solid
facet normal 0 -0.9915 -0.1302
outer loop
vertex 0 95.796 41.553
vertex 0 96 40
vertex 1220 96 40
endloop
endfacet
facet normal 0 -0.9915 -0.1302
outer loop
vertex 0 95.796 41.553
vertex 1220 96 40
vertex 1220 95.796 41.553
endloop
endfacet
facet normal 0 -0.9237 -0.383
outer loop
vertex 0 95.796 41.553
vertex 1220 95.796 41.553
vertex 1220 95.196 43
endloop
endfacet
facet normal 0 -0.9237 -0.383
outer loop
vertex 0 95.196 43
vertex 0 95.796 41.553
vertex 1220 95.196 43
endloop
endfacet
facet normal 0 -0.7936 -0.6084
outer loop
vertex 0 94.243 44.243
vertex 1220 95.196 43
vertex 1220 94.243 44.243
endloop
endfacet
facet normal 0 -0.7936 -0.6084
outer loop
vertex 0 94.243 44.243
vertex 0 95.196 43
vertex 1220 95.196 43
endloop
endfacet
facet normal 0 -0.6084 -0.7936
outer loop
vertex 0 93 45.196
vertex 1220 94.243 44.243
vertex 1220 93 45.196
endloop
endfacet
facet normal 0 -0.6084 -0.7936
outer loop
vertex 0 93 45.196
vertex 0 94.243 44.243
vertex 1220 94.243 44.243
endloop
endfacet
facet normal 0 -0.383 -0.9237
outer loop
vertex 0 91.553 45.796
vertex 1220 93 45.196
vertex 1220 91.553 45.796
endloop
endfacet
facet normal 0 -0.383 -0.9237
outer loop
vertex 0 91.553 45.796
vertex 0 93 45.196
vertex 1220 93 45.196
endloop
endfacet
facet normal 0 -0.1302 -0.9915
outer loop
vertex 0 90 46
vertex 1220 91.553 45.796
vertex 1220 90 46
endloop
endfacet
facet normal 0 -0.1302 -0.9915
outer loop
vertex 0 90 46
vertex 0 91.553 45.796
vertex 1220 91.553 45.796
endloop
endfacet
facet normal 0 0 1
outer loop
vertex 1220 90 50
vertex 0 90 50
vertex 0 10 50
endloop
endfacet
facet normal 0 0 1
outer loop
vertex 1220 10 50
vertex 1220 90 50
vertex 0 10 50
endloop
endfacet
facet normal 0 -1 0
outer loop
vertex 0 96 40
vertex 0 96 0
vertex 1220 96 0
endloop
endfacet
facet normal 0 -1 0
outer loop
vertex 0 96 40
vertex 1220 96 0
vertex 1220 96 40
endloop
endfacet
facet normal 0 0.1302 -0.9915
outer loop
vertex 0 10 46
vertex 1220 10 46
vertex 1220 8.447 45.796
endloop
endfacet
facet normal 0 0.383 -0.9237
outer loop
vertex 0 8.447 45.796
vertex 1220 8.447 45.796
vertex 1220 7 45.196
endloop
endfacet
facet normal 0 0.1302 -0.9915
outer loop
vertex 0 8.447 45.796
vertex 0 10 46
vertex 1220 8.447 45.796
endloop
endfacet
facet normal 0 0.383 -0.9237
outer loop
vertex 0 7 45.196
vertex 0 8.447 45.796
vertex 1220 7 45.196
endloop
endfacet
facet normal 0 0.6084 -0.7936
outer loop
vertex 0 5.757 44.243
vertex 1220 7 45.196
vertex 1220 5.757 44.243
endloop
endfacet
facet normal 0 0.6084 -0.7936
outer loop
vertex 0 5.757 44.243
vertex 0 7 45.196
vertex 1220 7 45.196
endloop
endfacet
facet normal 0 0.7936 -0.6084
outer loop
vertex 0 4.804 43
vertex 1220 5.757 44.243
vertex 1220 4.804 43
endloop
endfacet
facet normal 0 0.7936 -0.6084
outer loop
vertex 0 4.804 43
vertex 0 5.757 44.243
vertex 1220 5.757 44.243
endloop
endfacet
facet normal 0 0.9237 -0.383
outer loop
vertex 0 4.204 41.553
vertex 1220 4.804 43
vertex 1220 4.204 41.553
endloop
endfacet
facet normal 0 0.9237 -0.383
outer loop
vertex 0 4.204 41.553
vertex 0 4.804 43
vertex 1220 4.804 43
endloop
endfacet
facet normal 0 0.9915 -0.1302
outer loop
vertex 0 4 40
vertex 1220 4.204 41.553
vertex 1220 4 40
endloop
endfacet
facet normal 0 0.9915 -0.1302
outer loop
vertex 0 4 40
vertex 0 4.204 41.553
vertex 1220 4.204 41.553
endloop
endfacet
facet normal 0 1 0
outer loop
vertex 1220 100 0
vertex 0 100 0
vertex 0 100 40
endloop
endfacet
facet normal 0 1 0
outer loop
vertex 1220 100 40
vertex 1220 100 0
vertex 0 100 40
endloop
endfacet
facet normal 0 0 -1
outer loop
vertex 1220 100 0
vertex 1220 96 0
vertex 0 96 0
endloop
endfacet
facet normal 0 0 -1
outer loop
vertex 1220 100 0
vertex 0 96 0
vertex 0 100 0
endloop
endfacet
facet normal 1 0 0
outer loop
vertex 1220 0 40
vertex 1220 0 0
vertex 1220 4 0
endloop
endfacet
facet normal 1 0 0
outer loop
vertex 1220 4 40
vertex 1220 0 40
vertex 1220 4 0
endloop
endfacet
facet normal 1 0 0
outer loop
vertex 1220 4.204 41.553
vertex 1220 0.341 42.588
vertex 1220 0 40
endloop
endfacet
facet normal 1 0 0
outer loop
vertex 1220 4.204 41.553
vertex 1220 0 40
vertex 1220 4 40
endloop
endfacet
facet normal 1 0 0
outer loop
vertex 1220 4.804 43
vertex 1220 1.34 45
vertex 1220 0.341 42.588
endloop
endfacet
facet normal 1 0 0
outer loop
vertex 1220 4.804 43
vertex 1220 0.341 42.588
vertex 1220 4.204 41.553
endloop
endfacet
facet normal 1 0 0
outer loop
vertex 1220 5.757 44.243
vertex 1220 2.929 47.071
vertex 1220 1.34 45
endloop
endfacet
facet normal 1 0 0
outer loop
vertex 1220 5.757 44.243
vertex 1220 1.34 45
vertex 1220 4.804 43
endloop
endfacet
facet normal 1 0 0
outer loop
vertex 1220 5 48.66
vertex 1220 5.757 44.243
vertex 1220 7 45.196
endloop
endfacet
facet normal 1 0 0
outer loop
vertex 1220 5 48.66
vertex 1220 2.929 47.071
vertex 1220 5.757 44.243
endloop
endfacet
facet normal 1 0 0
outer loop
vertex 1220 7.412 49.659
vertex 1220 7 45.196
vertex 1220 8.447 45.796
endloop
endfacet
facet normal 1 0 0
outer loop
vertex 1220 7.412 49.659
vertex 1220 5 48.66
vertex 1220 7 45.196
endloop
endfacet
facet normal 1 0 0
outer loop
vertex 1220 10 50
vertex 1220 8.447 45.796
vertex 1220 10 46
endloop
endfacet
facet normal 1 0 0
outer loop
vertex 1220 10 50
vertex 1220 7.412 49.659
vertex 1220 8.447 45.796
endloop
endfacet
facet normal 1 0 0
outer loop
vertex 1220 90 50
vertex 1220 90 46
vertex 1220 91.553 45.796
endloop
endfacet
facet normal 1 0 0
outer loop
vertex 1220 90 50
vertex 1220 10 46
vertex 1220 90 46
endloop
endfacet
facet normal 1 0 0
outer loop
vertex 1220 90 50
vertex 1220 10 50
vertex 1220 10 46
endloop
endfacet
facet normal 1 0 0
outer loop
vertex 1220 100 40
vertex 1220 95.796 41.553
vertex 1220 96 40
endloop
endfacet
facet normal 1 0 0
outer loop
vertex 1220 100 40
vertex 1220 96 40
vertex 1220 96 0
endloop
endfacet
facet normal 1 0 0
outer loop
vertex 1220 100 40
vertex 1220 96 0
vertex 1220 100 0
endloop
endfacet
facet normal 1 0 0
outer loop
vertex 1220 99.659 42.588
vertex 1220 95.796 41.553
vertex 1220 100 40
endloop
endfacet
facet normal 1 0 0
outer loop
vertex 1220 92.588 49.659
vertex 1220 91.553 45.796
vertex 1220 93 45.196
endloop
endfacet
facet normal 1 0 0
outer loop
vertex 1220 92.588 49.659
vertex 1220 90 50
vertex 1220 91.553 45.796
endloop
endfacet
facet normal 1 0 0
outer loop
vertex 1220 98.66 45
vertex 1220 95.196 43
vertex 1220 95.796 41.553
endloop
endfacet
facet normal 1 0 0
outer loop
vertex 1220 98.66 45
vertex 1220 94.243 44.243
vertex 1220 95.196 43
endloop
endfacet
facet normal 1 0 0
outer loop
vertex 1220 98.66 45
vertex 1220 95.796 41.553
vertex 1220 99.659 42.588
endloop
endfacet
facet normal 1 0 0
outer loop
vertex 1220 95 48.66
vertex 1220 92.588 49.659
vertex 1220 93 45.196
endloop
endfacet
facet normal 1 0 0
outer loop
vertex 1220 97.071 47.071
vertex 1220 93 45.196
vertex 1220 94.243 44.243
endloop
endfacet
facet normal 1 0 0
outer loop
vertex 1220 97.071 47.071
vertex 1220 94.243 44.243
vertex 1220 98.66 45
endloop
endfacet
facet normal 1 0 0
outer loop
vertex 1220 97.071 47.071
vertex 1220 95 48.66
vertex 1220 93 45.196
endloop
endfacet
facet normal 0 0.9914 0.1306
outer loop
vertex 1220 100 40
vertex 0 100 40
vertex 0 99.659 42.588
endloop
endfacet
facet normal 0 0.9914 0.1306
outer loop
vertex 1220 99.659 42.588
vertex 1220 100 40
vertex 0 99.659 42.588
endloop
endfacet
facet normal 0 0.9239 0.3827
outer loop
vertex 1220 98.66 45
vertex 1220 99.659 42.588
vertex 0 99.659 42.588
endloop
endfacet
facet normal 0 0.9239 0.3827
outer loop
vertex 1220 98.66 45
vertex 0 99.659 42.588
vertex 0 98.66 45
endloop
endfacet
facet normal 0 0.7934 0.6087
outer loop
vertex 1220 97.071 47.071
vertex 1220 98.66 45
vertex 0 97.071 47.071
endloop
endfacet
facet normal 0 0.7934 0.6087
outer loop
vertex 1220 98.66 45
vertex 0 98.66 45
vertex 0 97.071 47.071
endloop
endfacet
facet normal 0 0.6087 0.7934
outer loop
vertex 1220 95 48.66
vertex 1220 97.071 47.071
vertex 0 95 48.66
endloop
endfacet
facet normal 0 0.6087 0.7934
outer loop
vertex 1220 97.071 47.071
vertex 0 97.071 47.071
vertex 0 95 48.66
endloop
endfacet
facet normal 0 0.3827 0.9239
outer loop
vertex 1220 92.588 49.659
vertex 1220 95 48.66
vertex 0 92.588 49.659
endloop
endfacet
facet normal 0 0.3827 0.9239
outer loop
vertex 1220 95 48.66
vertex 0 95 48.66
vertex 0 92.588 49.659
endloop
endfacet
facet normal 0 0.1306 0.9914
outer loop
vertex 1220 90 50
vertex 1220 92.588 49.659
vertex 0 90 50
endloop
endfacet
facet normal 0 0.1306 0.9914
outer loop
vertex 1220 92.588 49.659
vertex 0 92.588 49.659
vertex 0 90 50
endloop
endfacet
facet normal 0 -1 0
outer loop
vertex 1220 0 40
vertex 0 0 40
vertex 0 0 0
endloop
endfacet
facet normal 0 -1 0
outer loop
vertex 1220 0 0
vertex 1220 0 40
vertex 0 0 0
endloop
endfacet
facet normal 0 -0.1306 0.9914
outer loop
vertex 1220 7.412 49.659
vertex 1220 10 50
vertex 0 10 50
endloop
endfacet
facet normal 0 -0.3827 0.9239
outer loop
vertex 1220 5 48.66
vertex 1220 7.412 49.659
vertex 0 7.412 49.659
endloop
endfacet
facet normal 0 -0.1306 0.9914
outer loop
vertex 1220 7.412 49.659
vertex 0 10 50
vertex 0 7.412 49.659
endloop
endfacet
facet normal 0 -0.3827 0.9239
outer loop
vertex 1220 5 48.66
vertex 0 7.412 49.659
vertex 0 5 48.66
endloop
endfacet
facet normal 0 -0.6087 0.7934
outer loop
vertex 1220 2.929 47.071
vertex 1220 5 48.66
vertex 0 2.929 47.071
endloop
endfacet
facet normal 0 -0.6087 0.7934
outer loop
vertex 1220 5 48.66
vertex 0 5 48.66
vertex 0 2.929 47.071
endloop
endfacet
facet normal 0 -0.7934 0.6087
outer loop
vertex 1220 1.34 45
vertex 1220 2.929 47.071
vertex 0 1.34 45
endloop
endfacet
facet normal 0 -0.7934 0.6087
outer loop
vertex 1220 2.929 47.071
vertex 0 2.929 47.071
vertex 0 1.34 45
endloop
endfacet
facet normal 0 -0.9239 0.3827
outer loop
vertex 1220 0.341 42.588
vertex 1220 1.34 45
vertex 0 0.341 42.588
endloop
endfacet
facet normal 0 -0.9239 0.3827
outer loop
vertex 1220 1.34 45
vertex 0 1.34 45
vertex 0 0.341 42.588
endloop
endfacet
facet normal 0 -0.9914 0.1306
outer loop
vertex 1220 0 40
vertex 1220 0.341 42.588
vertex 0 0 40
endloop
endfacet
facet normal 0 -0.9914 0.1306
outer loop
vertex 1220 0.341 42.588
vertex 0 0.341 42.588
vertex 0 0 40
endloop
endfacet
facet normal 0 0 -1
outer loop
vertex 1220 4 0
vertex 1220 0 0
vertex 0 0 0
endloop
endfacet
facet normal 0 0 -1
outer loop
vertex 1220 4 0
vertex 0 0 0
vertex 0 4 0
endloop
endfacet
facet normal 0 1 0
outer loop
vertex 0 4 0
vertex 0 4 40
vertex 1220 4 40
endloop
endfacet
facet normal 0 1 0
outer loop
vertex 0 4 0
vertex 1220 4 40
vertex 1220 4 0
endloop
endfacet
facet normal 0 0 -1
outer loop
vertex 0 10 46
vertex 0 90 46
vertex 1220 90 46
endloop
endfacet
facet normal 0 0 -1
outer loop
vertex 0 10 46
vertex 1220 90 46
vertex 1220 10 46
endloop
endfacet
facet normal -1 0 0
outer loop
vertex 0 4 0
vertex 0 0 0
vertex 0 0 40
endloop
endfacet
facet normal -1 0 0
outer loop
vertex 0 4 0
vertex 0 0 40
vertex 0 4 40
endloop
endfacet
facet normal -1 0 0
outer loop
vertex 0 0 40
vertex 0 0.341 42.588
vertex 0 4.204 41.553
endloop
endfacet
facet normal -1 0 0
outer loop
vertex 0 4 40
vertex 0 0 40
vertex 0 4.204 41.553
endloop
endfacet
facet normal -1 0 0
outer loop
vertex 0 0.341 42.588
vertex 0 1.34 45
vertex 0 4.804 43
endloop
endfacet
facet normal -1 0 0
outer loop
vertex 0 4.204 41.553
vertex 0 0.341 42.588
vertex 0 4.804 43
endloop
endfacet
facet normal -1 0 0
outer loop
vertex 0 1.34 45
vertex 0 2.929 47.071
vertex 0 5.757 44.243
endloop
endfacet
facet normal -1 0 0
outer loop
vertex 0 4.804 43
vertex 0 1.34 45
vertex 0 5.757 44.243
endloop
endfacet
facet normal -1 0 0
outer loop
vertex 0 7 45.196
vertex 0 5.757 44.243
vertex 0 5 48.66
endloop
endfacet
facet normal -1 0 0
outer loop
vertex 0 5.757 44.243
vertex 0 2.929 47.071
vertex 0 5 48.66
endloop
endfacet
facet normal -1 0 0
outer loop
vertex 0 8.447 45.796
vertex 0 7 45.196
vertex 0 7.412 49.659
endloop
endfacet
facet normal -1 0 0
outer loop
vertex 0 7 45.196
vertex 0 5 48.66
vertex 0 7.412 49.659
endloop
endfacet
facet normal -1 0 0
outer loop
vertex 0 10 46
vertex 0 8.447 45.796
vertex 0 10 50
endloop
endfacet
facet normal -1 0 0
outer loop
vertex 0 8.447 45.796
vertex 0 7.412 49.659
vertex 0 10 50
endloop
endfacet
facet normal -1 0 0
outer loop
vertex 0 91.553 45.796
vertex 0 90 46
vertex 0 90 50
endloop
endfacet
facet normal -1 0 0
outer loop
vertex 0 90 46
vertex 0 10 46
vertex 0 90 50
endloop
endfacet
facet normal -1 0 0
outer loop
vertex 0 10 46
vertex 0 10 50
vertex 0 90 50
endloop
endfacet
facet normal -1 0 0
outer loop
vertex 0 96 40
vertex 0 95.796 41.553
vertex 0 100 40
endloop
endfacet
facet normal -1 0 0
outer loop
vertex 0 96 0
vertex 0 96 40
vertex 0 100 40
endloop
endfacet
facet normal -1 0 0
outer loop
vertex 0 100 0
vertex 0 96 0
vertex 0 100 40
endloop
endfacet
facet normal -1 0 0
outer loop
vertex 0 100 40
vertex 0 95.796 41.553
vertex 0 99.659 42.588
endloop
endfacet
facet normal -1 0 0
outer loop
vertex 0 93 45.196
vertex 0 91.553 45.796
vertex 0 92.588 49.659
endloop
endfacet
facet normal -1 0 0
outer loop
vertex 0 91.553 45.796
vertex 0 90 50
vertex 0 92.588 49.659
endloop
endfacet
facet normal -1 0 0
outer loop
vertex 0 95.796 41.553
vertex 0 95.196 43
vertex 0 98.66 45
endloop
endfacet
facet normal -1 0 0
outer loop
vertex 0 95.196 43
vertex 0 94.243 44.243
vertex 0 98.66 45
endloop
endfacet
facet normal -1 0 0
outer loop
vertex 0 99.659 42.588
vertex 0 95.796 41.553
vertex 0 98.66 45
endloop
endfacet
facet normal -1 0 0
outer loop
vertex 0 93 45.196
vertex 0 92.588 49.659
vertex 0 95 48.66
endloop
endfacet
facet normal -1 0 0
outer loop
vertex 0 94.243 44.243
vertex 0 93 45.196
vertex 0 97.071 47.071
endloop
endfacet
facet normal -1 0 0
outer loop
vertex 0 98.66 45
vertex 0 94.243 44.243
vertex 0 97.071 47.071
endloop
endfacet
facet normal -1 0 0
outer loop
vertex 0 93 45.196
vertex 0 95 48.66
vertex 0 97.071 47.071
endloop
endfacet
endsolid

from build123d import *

# Parameters (mm, degrees)
F1_DEPTH = 1220
F2_T     = -4


with BuildPart() as f1:
    # F0 (on Right) → F1 (new body)
    with BuildSketch(Plane.YZ):
        with BuildLine():
            Line((0, 40), (0, 0))
            Line((0, 0), (100, 0))
            Line((100, 0), (100, 40))
            ThreePointArc((100, 40), (97.071068, 47.071068), (90, 50))
            Line((90, 50), (10, 50))
            ThreePointArc((10, 50), (2.928932, 47.071068), (0, 40))
        make_face()
    extrude(amount=F1_DEPTH)

    # F2
    f2_openings = [f1.faces().sort_by_distance(p)[0] for p in [
        (610, 50, 0),
        (1220, 50, 24.80288),
        (0, 50, 24.80288),
    ]]
    offset(amount=F2_T, openings=f2_openings)


solid = f1.part
